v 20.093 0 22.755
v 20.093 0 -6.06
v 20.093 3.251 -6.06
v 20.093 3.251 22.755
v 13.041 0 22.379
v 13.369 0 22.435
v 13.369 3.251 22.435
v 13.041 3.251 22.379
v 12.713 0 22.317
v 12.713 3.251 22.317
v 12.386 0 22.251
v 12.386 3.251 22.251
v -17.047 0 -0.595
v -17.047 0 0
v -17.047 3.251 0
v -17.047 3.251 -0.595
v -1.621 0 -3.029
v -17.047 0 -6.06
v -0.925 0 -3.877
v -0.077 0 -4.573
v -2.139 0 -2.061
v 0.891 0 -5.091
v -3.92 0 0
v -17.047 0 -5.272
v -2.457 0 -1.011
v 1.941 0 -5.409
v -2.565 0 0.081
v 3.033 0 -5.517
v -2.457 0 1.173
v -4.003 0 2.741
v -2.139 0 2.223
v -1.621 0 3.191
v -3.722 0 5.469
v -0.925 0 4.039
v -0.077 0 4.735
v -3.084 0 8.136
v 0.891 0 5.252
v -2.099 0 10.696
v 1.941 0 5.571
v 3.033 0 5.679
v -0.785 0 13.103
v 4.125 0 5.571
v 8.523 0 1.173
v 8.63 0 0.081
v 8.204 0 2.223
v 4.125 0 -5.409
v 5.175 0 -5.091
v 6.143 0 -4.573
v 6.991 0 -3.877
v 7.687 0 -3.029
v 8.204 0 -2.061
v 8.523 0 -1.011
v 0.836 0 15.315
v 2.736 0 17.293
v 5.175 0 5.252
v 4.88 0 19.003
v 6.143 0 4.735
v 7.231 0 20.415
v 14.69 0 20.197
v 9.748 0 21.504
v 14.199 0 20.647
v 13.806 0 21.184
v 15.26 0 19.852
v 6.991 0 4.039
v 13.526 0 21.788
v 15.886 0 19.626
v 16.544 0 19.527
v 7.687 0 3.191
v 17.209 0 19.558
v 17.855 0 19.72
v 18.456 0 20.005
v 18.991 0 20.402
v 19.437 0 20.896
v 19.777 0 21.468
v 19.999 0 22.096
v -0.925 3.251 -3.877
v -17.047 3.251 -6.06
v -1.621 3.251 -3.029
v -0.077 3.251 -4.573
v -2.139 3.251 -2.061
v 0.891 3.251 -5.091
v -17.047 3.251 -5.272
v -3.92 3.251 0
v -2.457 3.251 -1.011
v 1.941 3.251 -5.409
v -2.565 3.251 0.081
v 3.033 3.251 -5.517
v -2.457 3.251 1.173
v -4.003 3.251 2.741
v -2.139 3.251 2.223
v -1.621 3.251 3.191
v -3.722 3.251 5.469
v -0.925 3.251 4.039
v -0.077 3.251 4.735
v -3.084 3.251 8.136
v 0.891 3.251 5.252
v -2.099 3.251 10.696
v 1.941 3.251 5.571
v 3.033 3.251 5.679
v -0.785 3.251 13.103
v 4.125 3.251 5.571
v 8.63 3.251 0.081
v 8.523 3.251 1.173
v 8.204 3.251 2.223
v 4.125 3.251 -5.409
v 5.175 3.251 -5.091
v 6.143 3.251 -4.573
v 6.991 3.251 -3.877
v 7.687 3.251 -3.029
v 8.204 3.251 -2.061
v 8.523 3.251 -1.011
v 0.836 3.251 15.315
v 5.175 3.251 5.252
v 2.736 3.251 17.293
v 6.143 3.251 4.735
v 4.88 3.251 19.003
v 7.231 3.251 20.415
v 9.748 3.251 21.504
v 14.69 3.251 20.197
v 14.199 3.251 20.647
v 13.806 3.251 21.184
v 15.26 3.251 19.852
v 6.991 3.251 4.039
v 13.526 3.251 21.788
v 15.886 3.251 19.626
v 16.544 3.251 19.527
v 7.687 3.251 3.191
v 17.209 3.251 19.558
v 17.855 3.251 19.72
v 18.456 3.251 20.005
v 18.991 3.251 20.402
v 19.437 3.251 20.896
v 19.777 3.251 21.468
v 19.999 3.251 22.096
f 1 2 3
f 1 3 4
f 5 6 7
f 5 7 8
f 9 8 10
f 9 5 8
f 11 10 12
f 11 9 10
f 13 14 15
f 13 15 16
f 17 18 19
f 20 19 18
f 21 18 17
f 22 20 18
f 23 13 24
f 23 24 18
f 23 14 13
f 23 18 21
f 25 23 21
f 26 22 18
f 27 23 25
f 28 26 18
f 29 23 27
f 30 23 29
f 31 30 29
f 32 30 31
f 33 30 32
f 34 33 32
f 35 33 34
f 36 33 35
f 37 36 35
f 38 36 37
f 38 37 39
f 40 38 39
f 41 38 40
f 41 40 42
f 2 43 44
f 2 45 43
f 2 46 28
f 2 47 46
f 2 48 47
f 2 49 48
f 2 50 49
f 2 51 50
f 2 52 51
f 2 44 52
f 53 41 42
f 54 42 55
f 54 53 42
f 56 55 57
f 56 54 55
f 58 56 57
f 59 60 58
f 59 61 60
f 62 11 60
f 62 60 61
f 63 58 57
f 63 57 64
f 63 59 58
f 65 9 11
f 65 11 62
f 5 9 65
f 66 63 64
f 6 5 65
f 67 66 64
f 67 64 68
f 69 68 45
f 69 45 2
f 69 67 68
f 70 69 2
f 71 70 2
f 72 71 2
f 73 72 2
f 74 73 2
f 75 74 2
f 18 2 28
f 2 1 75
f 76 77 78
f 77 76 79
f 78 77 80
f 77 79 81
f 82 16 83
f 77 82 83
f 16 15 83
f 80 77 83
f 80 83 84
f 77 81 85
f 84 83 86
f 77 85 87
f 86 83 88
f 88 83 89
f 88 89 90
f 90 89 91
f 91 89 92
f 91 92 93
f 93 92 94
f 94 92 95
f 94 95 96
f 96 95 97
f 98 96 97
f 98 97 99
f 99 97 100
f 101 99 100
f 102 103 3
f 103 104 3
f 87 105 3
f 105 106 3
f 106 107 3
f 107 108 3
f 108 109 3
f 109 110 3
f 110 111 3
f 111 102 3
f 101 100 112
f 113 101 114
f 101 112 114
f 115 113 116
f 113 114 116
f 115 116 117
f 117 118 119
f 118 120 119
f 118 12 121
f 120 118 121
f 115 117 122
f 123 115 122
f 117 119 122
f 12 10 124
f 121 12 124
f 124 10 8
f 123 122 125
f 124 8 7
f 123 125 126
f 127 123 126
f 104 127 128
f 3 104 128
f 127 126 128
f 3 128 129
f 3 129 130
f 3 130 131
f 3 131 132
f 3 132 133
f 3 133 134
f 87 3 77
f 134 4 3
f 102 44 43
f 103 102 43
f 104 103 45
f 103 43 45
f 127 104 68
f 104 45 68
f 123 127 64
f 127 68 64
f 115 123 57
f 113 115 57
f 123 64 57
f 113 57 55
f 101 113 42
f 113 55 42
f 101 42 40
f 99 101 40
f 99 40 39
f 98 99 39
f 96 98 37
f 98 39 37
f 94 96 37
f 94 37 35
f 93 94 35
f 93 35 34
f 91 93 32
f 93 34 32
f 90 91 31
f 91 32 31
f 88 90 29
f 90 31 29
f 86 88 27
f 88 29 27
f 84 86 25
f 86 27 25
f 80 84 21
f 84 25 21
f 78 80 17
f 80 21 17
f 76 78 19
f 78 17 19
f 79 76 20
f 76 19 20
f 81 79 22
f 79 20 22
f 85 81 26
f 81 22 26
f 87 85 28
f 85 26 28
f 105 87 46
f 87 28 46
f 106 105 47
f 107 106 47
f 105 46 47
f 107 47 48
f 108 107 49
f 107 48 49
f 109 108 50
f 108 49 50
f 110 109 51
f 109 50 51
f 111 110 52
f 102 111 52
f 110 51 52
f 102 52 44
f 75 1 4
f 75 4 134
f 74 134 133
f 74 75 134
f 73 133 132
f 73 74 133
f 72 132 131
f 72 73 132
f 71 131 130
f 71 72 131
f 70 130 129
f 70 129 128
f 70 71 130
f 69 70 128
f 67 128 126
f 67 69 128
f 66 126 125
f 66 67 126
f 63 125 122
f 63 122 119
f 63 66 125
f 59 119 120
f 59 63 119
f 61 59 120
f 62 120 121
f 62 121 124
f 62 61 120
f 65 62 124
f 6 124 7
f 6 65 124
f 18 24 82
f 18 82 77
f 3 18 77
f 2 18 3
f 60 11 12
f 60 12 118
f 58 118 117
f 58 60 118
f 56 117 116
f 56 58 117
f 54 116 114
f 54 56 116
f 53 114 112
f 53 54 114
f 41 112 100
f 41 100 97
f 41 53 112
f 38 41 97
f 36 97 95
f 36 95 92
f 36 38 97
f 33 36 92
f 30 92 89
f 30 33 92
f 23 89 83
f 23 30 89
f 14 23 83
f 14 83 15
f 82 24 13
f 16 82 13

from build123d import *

# Parameters (mm, degrees)
F0_W     = 0.834487
F0_H     = 4.677228
F0_R     = 5.597638
F1_DEPTH = 3.2512


with BuildPart() as f1:
    # F0 (on Front) → F1 (new body)
    with BuildSketch(Plane.XZ):
        with Locations((-16.629863, -2.933552)):
            Rectangle(F0_W, F0_H)
        with BuildLine():
            Line((-17.047107, -5.272166), (-17.047107, -6.060281))
            Line((-17.047107, -6.060281), (20.092821, -6.060281))
            Line((20.092821, -6.060281), (20.092821, 16.750548))
            add(Edge.make_bspline(
                [(12.386335, 22.250686), (13.07097, 20.542209), (14.079554, 17.765705), (18.172912, 18.994402), (19.766842, 17.223716), (20.092821, 16.750548)],
                knots=[0, 0, 0, 0, 4.344221, 8.073844, 10.215903, 10.215903, 10.215903, 10.215903], degree=3))
            ThreePointArc((12.386335, 22.250686), (-0.010698, 14.235434), (-3.920062, 0))
            Line((-3.920062, 0), (-17.047107, 0))
            Line((-17.047107, 0), (-17.047107, -0.594938))
            Line((-17.047107, -0.594938), (-16.21262, -0.594938))
            Line((-16.21262, -0.594938), (-16.21262, -5.272166))
            Line((-16.21262, -5.272166), (-17.047107, -5.272166))
        make_face()
        with Locations((3.032837, 0.080925)):
            Circle(F0_R, mode=Mode.SUBTRACT)
        with BuildLine():
            add(Edge.make_bspline(
                [(12.386335, 22.250686), (13.07097, 20.542209), (14.079554, 17.765705), (18.172912, 18.994402), (19.766842, 17.223716), (20.092821, 16.750548)],
                knots=[0, 0, 0, 0, 4.344221, 8.073844, 10.215903, 10.215903, 10.215903, 10.215903], degree=3))
            Line((20.092821, 16.750548), (20.092821, 22.755181))
            ThreePointArc((20.092821, 22.755181), (16.877156, 19.526201), (13.369215, 22.435008))
            ThreePointArc((13.369215, 22.435008), (12.876662, 22.34878), (12.386335, 22.250686))
        make_face()
    extrude(amount=-F1_DEPTH)


solid = f1.part
